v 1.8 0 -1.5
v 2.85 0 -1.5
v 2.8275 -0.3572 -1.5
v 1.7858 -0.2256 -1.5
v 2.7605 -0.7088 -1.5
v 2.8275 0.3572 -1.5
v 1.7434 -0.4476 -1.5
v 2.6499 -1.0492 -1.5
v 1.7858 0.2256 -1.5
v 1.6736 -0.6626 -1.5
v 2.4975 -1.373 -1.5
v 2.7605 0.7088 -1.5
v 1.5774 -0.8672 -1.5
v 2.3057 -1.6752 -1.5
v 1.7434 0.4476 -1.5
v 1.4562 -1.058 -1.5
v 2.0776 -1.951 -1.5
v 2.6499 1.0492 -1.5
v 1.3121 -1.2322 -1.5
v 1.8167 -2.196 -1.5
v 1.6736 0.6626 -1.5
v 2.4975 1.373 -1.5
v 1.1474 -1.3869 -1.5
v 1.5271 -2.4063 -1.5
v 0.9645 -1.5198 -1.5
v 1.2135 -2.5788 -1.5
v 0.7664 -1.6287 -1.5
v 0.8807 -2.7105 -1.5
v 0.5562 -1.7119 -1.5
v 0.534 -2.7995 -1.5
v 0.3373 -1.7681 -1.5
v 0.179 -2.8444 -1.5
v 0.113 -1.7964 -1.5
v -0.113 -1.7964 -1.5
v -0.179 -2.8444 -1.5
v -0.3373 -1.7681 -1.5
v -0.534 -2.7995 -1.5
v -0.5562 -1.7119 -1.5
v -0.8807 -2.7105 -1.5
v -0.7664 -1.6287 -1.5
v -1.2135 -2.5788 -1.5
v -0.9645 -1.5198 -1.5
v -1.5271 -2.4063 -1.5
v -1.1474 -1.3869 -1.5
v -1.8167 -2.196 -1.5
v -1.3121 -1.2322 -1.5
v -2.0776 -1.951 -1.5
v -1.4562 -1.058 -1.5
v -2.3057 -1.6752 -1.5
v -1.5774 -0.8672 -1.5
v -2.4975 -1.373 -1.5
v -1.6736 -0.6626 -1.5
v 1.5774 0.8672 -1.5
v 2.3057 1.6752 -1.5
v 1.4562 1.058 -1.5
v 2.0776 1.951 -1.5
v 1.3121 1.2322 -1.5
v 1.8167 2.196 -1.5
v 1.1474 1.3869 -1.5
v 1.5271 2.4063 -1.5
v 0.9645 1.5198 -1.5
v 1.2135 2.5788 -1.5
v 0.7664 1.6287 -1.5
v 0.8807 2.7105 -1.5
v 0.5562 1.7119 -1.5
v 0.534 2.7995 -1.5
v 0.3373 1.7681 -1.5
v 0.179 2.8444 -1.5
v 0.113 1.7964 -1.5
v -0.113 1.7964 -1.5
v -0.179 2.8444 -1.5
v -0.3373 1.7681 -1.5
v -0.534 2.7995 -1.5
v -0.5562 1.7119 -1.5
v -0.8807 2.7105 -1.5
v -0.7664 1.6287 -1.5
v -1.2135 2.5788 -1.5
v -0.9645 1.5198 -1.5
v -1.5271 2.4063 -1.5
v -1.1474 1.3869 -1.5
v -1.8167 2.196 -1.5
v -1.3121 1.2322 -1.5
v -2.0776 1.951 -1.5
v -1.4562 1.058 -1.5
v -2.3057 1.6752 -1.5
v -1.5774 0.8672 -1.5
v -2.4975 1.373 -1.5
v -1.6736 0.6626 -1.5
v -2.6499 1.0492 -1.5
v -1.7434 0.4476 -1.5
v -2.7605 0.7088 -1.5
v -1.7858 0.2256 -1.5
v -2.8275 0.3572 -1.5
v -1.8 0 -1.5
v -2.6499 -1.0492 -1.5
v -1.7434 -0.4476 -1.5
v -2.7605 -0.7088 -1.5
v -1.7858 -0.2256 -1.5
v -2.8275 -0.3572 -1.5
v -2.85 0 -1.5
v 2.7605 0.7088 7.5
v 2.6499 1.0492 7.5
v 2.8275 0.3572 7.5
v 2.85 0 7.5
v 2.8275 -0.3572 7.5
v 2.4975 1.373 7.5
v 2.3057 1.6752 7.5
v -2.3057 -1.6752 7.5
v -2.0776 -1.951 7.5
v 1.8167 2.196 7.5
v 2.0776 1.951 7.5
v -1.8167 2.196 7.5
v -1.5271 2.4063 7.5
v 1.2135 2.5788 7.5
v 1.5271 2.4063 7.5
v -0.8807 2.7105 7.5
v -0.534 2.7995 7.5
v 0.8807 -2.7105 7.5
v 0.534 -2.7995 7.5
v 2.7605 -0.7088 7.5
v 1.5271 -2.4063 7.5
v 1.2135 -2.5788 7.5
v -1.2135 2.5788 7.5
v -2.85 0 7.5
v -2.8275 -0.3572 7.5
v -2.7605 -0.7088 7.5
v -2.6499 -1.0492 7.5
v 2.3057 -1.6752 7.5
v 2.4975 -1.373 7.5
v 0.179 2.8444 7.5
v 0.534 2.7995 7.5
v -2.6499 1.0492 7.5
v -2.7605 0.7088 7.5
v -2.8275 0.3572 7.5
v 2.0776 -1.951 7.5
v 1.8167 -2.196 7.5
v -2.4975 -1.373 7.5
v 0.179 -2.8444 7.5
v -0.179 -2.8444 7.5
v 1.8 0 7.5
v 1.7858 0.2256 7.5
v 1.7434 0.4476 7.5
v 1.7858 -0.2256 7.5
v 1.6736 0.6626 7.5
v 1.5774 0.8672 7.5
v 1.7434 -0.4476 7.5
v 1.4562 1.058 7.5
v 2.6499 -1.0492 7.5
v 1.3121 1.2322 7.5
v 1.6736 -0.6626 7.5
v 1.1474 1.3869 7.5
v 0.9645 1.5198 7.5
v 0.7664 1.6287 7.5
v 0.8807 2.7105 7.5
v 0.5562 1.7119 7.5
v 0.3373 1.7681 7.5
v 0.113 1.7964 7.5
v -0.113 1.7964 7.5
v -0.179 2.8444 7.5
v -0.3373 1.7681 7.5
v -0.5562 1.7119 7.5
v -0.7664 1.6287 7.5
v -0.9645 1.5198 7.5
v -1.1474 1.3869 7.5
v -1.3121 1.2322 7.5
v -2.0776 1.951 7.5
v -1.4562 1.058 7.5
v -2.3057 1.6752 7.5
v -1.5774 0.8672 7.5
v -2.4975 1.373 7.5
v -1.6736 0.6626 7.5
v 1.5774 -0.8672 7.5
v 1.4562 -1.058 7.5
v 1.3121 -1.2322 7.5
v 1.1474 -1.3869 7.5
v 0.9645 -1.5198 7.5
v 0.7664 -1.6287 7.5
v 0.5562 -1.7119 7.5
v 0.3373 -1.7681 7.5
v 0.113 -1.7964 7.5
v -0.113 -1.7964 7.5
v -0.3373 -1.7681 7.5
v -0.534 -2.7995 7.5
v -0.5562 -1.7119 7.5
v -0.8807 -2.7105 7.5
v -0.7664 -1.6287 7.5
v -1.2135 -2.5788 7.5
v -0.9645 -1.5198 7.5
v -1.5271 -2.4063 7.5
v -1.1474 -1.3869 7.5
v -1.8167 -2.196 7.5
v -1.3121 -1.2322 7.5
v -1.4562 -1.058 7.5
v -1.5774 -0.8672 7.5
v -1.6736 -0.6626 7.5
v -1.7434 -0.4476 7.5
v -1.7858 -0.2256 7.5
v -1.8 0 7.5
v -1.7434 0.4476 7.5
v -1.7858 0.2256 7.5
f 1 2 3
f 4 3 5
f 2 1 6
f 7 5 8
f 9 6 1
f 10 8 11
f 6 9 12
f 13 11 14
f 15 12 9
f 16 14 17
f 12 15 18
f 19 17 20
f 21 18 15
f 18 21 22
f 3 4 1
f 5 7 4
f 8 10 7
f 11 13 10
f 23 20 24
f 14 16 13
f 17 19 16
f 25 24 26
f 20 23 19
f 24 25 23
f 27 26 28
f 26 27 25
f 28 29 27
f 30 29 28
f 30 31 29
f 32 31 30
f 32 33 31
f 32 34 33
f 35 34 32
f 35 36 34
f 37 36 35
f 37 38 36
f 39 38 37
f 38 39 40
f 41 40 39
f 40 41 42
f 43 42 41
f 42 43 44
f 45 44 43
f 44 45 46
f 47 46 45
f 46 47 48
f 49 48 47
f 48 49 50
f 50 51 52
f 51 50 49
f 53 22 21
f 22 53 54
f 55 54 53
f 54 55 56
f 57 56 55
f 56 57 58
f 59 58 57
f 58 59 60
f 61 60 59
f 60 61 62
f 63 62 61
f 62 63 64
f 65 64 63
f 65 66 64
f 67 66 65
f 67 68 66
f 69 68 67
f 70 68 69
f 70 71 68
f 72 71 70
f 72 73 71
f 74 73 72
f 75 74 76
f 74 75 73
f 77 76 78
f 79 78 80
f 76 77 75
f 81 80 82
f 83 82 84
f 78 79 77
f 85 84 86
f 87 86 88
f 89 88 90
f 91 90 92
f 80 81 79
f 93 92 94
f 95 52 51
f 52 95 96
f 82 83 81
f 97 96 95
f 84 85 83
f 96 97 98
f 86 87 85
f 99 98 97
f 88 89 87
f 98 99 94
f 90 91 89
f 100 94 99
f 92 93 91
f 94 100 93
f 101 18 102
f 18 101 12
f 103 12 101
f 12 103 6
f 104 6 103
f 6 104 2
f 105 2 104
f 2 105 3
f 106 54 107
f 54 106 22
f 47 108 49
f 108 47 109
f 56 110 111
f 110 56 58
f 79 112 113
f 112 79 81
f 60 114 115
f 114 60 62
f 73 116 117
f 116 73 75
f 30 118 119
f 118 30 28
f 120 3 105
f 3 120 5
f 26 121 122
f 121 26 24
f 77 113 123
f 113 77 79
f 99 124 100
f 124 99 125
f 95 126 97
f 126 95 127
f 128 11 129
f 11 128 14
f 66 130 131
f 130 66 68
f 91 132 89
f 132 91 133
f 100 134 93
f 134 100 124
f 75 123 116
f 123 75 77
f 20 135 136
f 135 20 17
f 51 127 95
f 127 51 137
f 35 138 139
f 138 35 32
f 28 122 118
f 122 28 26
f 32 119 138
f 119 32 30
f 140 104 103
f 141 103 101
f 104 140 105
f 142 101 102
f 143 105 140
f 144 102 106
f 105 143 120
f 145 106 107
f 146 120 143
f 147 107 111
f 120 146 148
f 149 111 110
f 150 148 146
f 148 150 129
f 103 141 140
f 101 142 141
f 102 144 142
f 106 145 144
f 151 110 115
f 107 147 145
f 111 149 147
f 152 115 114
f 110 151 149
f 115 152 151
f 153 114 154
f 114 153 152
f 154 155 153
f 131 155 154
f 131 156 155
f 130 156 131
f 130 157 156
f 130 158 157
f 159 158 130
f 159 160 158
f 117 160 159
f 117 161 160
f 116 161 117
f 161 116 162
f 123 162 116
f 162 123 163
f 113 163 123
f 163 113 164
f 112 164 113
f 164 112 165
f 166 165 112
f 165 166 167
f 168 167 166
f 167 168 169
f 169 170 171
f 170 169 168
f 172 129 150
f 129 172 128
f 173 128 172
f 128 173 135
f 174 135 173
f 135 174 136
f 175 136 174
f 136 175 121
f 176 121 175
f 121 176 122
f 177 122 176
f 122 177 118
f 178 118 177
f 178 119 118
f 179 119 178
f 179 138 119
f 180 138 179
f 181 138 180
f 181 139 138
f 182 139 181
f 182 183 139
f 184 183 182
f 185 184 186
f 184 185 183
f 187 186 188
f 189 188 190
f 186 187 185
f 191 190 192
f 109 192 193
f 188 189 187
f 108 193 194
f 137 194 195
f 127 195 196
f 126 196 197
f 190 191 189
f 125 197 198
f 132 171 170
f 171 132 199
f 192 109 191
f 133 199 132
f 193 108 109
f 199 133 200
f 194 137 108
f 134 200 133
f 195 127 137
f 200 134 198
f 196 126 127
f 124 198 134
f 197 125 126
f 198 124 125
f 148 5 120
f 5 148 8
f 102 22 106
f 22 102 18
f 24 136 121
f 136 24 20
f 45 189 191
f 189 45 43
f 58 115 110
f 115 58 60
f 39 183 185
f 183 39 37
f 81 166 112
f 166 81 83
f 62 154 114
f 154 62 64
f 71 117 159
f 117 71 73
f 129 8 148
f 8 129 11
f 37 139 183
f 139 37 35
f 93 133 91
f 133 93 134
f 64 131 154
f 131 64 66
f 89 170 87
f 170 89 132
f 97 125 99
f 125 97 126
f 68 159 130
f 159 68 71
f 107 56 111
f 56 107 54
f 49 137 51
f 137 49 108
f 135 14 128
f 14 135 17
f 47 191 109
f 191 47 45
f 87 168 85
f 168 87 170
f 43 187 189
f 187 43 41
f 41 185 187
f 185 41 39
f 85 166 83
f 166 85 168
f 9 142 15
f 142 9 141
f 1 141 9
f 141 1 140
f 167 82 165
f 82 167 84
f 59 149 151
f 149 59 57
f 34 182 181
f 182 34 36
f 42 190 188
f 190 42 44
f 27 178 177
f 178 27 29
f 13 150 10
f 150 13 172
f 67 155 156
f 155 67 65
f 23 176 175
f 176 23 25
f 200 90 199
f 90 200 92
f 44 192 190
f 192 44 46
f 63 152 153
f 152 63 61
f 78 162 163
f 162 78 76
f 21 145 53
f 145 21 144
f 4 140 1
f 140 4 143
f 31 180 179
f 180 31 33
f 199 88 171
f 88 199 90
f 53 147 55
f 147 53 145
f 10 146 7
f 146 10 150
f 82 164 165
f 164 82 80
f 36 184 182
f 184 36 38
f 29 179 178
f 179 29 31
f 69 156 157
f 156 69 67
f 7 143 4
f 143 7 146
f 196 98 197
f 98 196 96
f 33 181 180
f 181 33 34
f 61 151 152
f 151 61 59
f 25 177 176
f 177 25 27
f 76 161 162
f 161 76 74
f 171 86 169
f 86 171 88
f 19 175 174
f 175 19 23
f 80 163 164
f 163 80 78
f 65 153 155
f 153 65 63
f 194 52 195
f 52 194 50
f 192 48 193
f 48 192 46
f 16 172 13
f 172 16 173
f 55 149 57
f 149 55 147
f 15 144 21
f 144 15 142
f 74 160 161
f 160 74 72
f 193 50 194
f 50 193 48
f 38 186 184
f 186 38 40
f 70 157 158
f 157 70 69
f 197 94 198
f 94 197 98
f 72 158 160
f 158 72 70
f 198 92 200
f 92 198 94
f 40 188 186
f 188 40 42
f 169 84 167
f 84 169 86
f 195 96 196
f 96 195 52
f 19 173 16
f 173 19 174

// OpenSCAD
$fn = 50;


difference() {
	union() {
		translate(v = [0, 0, -1.5000000000]) {
			cylinder(h = 3, r = 1.0000000000);
		}
		translate(v = [0, 0, -1.5000000000]) {
			cylinder(h = 9, r = 2.8500000000);
		}
	}
	union() {
		translate(v = [0, 0, -100.0000000000]) {
			cylinder(h = 200, r = 1.8000000000);
		}
	}
}
